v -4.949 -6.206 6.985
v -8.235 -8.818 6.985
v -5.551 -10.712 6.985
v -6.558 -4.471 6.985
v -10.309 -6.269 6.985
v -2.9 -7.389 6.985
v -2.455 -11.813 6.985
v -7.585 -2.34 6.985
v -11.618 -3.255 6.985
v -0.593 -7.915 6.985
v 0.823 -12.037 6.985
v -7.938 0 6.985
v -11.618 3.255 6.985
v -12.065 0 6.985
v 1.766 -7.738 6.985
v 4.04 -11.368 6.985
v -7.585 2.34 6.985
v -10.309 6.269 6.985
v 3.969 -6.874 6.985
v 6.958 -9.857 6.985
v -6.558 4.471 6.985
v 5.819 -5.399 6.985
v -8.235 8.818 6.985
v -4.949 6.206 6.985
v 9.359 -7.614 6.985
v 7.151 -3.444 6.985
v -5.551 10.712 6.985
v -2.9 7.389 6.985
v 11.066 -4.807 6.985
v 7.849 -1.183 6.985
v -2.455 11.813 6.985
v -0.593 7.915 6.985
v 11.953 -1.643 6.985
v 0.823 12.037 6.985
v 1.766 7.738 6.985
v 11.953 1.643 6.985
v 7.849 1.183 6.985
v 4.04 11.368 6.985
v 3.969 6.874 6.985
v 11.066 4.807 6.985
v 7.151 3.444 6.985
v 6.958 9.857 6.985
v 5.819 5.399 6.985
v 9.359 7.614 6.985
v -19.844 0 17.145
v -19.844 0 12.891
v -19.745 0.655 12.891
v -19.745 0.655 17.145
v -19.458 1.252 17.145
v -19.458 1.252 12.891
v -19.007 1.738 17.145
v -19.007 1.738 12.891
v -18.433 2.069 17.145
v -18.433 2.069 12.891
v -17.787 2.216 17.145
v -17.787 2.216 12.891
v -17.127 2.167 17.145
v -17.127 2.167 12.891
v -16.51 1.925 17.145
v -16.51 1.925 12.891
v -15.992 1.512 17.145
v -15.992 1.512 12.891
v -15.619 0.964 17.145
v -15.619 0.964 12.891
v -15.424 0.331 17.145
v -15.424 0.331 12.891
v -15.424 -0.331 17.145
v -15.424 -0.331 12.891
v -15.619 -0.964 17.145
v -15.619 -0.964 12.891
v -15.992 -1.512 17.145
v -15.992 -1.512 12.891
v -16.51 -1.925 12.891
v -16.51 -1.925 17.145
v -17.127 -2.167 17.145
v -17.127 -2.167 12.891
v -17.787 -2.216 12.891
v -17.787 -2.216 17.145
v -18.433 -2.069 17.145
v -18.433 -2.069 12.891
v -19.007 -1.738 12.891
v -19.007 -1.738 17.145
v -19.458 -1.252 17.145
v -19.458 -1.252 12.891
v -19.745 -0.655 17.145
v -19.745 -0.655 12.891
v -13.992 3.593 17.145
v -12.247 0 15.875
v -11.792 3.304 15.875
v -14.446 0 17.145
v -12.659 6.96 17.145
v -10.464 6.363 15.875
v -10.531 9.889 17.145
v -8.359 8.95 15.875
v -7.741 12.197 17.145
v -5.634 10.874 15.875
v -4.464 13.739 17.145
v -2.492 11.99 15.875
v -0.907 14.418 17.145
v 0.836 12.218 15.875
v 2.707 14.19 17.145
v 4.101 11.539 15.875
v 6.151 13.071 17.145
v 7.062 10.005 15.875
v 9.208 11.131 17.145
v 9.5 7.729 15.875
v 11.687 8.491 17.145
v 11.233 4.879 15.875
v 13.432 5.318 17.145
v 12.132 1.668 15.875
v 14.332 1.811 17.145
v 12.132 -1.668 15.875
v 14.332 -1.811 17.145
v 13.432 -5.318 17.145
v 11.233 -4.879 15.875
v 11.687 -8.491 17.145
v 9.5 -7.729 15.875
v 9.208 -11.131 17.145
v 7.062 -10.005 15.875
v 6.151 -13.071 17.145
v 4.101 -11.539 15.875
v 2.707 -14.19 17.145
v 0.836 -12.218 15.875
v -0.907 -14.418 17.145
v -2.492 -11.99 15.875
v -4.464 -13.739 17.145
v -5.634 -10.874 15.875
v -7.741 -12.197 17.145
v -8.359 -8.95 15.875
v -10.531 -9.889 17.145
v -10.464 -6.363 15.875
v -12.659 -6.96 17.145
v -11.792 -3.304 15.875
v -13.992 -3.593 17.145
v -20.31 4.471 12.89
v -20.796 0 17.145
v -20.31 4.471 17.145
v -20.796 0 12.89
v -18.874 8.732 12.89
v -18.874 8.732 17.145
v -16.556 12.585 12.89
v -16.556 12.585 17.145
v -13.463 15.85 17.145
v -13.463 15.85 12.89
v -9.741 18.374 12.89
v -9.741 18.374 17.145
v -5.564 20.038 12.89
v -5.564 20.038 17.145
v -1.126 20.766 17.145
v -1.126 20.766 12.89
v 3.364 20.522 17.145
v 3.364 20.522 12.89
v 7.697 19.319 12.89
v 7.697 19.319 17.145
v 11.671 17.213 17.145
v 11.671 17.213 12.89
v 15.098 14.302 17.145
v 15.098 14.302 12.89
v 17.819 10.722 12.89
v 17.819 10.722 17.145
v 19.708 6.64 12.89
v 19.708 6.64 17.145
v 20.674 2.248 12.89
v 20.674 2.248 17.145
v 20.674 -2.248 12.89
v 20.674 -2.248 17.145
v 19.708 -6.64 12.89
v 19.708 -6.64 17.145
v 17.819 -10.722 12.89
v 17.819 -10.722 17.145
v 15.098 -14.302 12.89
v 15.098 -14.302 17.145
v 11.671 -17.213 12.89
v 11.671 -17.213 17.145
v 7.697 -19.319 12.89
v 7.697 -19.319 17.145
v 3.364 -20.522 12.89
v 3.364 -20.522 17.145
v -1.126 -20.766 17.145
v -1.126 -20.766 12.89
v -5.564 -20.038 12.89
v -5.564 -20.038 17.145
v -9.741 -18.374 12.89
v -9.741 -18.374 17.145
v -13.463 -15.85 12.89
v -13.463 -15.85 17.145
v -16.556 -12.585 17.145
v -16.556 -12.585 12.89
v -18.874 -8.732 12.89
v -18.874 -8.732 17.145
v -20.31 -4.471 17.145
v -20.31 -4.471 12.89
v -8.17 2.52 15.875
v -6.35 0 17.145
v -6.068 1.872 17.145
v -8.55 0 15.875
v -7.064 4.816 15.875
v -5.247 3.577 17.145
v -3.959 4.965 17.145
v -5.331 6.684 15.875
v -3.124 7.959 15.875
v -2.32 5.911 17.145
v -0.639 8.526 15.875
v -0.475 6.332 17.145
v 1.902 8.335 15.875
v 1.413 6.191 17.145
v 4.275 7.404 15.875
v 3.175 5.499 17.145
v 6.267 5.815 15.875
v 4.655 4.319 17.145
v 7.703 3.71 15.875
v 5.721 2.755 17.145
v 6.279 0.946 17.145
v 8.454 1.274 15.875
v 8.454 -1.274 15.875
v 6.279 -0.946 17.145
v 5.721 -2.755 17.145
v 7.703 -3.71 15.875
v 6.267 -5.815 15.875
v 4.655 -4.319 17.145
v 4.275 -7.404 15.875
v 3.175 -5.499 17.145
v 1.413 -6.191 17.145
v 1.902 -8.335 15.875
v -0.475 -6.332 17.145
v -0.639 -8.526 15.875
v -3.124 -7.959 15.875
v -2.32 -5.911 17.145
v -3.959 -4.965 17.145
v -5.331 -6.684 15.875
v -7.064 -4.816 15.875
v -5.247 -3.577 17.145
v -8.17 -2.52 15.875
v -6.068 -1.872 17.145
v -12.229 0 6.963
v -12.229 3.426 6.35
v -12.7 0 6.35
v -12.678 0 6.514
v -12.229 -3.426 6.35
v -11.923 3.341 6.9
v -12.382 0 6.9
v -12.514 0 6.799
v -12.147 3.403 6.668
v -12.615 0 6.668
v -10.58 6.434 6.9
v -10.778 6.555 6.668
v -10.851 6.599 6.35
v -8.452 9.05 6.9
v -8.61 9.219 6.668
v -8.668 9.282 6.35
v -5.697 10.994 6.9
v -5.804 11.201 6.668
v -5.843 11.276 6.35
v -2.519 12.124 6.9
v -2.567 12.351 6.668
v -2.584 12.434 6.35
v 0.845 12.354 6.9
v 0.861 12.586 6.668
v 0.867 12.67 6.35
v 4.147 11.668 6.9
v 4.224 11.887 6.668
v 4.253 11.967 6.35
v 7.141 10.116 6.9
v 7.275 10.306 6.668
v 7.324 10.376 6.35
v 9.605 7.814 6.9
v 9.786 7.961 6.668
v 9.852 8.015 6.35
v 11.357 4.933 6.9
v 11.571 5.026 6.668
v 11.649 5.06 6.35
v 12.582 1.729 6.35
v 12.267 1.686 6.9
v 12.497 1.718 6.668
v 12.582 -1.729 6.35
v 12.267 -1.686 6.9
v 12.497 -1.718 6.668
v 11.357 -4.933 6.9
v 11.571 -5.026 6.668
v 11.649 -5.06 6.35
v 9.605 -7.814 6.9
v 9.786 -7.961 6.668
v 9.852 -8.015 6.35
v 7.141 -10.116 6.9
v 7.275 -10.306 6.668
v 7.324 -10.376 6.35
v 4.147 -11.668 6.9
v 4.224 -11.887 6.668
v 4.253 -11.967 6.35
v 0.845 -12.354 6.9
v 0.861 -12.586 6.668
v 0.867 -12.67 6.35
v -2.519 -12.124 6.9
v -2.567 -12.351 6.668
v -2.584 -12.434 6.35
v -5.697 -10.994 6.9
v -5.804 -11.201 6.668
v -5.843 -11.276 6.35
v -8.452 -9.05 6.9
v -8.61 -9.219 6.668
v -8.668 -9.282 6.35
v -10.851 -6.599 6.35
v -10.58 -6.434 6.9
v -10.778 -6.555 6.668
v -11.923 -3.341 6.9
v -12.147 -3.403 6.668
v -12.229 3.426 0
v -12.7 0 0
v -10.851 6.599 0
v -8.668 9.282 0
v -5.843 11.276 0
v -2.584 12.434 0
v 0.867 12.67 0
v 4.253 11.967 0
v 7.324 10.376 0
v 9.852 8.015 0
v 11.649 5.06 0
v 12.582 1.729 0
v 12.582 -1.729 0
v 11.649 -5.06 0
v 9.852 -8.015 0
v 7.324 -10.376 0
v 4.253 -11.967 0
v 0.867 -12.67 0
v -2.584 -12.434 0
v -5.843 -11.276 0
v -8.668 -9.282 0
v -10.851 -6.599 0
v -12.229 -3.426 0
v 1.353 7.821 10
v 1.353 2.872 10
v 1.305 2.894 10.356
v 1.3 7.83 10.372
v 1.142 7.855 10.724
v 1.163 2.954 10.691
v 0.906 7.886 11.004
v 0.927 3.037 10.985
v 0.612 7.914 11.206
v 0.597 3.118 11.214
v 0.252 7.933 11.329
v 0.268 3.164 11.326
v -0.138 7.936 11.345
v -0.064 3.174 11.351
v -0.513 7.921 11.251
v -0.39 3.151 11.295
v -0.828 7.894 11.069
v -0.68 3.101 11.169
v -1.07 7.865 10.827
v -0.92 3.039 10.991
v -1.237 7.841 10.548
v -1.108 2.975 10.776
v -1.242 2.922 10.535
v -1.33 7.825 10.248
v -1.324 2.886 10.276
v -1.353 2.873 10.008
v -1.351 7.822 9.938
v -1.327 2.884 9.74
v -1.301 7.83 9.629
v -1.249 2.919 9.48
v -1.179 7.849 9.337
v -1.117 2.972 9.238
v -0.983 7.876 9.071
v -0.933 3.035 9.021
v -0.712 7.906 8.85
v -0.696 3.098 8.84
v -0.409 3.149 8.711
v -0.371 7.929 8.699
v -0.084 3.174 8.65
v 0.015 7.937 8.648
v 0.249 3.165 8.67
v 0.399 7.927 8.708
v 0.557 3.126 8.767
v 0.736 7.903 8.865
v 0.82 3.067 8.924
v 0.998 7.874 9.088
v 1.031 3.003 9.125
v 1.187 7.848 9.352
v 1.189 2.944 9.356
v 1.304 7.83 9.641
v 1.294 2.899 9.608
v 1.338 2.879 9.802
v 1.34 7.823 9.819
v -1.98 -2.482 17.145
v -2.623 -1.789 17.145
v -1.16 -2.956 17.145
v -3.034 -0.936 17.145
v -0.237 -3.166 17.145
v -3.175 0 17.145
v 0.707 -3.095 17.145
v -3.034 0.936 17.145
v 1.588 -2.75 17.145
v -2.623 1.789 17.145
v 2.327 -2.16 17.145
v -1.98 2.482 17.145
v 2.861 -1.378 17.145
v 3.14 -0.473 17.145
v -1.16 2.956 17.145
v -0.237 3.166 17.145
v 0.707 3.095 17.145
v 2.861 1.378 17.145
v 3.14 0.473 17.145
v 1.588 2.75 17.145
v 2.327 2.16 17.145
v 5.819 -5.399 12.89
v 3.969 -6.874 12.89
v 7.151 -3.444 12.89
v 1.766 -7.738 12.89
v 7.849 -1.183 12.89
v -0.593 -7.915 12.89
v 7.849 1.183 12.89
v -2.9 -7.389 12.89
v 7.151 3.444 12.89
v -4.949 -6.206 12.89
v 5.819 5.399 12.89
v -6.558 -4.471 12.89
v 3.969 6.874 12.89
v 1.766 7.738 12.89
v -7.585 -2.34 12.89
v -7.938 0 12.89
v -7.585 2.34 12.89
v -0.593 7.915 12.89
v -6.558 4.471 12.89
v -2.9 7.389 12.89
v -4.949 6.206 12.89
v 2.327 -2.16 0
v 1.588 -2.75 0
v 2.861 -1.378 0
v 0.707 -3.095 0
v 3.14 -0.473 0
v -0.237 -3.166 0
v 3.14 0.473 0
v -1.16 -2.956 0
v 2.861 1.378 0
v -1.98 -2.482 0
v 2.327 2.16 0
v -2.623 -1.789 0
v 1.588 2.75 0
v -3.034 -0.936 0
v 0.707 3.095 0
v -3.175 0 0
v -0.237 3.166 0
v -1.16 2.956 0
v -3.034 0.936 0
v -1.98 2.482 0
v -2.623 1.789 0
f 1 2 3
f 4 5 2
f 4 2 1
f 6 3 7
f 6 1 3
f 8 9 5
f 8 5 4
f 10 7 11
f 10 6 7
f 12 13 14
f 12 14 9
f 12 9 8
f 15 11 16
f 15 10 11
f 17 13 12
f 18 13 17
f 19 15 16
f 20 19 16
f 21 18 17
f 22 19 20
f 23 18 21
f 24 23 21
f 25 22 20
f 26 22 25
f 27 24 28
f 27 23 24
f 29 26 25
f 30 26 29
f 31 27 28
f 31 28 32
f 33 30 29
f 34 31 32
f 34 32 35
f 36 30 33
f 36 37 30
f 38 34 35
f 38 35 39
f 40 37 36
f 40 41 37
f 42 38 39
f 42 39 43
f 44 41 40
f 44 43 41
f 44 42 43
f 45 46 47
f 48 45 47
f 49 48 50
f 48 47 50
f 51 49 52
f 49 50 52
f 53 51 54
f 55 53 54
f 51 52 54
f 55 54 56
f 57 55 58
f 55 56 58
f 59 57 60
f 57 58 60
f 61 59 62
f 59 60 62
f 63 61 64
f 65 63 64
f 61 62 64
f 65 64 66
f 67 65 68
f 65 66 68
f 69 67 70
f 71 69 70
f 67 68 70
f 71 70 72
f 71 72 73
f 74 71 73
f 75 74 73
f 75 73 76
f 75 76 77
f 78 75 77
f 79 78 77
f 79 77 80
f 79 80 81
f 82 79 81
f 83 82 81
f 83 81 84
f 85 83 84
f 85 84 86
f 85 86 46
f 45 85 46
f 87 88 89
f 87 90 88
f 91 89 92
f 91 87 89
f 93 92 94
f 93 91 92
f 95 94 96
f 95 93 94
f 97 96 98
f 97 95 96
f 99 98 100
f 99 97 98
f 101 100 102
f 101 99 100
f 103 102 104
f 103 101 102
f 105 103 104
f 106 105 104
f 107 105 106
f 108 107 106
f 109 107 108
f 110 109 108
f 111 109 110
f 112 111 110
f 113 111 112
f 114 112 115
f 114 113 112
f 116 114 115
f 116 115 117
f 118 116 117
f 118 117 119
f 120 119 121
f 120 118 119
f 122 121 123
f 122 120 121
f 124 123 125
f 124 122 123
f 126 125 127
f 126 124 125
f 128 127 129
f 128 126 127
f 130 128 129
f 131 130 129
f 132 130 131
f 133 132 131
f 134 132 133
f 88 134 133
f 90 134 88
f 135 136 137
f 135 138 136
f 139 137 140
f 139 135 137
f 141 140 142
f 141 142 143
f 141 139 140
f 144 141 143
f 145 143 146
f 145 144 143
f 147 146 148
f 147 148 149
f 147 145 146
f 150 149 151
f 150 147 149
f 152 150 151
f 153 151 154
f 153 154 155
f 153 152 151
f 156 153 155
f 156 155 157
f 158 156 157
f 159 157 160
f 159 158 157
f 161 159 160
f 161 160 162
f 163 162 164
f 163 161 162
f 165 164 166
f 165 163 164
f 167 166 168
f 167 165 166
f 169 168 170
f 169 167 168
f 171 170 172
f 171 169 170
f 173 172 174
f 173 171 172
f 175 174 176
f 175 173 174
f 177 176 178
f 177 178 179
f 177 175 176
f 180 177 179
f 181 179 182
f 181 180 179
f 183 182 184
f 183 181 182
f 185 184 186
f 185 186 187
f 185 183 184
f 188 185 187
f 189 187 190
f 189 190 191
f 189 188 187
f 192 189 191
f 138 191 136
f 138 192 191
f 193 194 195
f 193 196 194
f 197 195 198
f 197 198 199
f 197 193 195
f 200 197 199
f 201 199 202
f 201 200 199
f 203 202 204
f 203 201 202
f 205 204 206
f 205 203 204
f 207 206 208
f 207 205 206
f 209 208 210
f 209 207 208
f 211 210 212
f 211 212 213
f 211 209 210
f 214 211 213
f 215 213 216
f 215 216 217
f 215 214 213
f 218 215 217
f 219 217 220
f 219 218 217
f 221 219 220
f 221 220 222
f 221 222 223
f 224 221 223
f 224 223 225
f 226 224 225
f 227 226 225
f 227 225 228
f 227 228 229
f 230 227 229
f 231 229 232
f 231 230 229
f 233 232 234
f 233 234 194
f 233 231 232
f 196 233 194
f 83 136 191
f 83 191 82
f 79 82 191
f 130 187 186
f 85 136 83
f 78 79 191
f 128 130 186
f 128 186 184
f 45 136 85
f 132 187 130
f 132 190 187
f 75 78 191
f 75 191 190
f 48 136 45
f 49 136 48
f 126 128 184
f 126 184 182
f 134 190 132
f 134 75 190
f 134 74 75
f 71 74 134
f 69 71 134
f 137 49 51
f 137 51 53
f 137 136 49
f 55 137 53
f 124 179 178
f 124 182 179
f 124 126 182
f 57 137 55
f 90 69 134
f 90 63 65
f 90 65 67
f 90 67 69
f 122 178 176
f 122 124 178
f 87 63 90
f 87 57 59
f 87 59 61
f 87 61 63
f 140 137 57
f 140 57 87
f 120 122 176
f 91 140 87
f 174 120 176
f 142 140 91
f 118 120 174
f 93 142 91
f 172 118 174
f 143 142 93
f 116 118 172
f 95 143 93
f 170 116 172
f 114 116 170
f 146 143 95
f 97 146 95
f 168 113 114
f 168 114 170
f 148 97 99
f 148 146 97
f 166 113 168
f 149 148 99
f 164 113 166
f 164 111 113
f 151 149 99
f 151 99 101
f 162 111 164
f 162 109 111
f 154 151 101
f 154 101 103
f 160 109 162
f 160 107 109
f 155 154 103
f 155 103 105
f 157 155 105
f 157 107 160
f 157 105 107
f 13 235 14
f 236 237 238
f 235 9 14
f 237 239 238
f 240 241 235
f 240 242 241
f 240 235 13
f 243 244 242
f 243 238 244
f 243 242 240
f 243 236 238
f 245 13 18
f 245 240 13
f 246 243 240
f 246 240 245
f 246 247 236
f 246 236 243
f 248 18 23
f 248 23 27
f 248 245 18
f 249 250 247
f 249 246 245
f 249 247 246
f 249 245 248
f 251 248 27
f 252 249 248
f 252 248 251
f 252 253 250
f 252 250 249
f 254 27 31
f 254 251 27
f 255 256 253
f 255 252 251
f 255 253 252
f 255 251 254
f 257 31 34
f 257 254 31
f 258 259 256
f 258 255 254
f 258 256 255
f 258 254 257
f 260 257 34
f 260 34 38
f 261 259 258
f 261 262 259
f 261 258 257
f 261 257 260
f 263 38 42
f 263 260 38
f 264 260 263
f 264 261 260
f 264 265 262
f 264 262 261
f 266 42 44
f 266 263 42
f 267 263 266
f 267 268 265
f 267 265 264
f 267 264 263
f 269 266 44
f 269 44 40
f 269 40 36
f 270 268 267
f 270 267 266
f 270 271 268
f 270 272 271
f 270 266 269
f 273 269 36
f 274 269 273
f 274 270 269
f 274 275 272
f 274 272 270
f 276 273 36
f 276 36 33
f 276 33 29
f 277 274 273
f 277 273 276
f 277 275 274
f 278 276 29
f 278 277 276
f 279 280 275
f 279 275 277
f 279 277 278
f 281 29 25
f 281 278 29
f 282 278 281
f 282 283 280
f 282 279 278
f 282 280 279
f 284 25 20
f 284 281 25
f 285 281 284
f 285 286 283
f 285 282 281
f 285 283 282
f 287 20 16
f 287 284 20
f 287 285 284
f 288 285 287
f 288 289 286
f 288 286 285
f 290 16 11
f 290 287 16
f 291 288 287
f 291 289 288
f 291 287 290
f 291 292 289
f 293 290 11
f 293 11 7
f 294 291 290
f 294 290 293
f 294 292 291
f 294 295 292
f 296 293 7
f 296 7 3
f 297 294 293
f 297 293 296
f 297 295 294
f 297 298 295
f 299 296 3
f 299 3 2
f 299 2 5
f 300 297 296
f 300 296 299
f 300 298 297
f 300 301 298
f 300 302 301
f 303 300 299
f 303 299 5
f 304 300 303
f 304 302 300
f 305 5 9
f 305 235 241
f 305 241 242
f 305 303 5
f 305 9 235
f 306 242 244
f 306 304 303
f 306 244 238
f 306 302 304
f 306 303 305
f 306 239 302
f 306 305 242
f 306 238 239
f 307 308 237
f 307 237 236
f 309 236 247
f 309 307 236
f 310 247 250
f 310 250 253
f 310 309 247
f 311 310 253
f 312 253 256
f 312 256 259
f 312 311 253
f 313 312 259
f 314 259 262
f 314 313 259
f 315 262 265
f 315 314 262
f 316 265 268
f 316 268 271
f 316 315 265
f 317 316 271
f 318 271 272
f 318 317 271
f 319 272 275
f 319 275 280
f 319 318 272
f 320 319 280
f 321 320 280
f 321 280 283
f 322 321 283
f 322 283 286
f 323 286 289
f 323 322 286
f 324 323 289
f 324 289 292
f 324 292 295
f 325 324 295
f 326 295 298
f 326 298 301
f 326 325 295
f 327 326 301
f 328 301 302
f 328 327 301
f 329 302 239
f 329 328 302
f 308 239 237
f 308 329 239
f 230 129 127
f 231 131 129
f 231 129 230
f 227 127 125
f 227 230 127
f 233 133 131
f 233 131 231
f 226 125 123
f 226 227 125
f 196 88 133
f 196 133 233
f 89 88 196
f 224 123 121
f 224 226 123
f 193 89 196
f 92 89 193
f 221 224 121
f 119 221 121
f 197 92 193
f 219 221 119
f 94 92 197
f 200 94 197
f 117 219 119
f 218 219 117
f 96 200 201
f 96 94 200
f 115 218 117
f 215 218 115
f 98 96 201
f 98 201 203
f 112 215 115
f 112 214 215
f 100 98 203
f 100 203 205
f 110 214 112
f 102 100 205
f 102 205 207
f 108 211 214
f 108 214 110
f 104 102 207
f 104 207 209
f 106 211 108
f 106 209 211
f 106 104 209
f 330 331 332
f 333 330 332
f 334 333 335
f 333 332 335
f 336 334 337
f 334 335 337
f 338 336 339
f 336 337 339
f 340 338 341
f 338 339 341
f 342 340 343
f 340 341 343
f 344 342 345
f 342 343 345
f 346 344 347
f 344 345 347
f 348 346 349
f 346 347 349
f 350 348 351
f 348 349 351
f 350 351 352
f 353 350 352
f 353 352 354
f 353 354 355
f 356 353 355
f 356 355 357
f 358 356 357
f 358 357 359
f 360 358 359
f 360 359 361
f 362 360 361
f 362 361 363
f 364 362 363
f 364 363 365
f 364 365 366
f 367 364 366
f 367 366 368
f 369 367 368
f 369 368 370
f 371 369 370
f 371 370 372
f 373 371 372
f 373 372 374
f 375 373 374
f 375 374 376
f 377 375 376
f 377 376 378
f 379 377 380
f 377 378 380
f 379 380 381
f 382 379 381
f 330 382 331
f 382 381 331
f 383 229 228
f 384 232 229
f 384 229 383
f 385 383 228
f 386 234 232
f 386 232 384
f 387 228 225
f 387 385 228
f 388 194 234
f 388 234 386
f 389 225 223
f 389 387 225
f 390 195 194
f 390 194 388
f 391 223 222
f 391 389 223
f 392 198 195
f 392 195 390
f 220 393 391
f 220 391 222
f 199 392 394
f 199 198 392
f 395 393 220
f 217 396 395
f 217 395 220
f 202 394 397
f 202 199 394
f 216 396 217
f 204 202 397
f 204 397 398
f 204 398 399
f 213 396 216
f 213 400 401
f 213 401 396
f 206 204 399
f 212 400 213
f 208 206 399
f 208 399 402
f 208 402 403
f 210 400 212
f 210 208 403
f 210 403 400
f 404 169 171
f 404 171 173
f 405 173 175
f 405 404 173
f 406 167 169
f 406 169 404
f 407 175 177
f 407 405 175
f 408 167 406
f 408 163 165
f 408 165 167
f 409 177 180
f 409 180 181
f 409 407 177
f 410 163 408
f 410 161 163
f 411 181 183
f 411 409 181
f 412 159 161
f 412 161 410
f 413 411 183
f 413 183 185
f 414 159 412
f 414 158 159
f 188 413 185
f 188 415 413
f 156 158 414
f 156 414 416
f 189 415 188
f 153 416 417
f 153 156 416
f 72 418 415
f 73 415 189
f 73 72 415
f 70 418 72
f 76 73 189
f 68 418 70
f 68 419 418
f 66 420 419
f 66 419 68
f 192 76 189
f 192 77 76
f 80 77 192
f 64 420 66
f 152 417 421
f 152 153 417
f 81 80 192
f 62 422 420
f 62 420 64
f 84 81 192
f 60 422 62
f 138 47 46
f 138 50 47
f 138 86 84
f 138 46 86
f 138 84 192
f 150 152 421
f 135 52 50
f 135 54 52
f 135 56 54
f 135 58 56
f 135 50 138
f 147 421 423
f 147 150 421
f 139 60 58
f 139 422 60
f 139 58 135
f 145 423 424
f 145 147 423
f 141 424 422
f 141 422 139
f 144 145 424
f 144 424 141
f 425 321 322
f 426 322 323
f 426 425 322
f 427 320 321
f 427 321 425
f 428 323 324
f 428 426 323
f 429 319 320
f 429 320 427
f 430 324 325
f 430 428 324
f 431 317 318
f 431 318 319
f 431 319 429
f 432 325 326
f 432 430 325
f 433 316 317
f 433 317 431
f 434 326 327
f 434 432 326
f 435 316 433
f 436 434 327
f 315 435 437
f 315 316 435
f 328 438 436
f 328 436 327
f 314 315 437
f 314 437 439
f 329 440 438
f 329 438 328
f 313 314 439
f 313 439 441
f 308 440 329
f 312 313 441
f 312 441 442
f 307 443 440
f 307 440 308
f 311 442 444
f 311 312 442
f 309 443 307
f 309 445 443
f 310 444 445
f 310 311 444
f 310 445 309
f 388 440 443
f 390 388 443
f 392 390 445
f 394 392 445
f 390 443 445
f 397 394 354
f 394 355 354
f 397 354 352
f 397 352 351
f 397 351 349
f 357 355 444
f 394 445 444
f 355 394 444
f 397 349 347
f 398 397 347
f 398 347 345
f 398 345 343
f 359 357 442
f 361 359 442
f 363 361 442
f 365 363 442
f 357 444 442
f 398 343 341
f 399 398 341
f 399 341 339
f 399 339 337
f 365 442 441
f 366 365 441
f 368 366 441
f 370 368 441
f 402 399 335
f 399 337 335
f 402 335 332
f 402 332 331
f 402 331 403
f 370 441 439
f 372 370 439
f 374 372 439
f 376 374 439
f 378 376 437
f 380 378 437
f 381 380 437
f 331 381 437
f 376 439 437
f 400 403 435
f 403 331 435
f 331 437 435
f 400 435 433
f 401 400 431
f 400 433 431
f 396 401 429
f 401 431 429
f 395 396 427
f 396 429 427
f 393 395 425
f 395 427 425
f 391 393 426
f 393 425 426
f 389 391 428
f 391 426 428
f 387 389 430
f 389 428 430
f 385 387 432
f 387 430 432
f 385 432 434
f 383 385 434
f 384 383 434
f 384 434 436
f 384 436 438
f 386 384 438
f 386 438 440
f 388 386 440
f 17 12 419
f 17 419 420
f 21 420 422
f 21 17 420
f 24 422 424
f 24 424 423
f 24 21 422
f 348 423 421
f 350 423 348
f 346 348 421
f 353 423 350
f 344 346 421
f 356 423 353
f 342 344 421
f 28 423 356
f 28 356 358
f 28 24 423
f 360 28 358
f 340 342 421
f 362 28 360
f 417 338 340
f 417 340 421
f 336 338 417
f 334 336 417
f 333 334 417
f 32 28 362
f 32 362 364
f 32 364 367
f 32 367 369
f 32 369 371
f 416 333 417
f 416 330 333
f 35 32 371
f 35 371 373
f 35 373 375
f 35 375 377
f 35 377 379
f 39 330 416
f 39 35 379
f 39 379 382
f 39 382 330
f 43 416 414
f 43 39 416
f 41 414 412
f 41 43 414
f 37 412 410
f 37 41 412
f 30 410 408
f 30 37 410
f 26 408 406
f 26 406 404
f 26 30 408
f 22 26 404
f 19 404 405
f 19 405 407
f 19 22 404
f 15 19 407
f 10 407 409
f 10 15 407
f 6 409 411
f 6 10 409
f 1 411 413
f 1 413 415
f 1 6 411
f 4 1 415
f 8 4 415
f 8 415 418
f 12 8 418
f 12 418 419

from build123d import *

# Parameters (mm, degrees)
F2_R     = 0.635
F4_D     = 6.35
F6_D     = 4.445
F7_D     = 2.7051
F7_DEPTH = 20.79725


with BuildPart() as f1:
    # F0 (on Front) → F1 (revolve)
    with BuildSketch(Plane.XZ):
        Polygon((-12.7, 0), (0, 0), (0, 17.145), (-6.35, 17.145), (-8.5497045256, 15.875), (-12.2465454744, 15.875), (-14.44625, 17.145), (-20.79625, 17.145), (-20.79625, 12.8905), (-7.9375, 12.8905), (-7.9375, 6.985), (-12.7, 6.985), align=None)
    revolve(axis=Axis((0, 0, 8.5725), (0, 0, -1)))

    # F2
    f2_edges = [f1.edges().sort_by_distance(p)[0] for p in [
        (12.7, 0, 6.985),
    ]]
    fillet(f2_edges, radius=F2_R)

    # F4 (through all)
    with Locations(Plane.XY.offset(17.145)):
        with Locations((0, 0)):
            Hole(F4_D / 2)

    # F6 (through all)
    with Locations(Plane.XY.offset(17.145)):
        with Locations((-17.62125, 0)):
            Hole(F6_D / 2)

    # F7 (through all, one way)
    with BuildSketch(Plane.XZ):
        with Locations((0, 10)):
            Circle(F7_D / 2)
    extrude(amount=-F7_DEPTH, mode=Mode.SUBTRACT)


solid = f1.part
